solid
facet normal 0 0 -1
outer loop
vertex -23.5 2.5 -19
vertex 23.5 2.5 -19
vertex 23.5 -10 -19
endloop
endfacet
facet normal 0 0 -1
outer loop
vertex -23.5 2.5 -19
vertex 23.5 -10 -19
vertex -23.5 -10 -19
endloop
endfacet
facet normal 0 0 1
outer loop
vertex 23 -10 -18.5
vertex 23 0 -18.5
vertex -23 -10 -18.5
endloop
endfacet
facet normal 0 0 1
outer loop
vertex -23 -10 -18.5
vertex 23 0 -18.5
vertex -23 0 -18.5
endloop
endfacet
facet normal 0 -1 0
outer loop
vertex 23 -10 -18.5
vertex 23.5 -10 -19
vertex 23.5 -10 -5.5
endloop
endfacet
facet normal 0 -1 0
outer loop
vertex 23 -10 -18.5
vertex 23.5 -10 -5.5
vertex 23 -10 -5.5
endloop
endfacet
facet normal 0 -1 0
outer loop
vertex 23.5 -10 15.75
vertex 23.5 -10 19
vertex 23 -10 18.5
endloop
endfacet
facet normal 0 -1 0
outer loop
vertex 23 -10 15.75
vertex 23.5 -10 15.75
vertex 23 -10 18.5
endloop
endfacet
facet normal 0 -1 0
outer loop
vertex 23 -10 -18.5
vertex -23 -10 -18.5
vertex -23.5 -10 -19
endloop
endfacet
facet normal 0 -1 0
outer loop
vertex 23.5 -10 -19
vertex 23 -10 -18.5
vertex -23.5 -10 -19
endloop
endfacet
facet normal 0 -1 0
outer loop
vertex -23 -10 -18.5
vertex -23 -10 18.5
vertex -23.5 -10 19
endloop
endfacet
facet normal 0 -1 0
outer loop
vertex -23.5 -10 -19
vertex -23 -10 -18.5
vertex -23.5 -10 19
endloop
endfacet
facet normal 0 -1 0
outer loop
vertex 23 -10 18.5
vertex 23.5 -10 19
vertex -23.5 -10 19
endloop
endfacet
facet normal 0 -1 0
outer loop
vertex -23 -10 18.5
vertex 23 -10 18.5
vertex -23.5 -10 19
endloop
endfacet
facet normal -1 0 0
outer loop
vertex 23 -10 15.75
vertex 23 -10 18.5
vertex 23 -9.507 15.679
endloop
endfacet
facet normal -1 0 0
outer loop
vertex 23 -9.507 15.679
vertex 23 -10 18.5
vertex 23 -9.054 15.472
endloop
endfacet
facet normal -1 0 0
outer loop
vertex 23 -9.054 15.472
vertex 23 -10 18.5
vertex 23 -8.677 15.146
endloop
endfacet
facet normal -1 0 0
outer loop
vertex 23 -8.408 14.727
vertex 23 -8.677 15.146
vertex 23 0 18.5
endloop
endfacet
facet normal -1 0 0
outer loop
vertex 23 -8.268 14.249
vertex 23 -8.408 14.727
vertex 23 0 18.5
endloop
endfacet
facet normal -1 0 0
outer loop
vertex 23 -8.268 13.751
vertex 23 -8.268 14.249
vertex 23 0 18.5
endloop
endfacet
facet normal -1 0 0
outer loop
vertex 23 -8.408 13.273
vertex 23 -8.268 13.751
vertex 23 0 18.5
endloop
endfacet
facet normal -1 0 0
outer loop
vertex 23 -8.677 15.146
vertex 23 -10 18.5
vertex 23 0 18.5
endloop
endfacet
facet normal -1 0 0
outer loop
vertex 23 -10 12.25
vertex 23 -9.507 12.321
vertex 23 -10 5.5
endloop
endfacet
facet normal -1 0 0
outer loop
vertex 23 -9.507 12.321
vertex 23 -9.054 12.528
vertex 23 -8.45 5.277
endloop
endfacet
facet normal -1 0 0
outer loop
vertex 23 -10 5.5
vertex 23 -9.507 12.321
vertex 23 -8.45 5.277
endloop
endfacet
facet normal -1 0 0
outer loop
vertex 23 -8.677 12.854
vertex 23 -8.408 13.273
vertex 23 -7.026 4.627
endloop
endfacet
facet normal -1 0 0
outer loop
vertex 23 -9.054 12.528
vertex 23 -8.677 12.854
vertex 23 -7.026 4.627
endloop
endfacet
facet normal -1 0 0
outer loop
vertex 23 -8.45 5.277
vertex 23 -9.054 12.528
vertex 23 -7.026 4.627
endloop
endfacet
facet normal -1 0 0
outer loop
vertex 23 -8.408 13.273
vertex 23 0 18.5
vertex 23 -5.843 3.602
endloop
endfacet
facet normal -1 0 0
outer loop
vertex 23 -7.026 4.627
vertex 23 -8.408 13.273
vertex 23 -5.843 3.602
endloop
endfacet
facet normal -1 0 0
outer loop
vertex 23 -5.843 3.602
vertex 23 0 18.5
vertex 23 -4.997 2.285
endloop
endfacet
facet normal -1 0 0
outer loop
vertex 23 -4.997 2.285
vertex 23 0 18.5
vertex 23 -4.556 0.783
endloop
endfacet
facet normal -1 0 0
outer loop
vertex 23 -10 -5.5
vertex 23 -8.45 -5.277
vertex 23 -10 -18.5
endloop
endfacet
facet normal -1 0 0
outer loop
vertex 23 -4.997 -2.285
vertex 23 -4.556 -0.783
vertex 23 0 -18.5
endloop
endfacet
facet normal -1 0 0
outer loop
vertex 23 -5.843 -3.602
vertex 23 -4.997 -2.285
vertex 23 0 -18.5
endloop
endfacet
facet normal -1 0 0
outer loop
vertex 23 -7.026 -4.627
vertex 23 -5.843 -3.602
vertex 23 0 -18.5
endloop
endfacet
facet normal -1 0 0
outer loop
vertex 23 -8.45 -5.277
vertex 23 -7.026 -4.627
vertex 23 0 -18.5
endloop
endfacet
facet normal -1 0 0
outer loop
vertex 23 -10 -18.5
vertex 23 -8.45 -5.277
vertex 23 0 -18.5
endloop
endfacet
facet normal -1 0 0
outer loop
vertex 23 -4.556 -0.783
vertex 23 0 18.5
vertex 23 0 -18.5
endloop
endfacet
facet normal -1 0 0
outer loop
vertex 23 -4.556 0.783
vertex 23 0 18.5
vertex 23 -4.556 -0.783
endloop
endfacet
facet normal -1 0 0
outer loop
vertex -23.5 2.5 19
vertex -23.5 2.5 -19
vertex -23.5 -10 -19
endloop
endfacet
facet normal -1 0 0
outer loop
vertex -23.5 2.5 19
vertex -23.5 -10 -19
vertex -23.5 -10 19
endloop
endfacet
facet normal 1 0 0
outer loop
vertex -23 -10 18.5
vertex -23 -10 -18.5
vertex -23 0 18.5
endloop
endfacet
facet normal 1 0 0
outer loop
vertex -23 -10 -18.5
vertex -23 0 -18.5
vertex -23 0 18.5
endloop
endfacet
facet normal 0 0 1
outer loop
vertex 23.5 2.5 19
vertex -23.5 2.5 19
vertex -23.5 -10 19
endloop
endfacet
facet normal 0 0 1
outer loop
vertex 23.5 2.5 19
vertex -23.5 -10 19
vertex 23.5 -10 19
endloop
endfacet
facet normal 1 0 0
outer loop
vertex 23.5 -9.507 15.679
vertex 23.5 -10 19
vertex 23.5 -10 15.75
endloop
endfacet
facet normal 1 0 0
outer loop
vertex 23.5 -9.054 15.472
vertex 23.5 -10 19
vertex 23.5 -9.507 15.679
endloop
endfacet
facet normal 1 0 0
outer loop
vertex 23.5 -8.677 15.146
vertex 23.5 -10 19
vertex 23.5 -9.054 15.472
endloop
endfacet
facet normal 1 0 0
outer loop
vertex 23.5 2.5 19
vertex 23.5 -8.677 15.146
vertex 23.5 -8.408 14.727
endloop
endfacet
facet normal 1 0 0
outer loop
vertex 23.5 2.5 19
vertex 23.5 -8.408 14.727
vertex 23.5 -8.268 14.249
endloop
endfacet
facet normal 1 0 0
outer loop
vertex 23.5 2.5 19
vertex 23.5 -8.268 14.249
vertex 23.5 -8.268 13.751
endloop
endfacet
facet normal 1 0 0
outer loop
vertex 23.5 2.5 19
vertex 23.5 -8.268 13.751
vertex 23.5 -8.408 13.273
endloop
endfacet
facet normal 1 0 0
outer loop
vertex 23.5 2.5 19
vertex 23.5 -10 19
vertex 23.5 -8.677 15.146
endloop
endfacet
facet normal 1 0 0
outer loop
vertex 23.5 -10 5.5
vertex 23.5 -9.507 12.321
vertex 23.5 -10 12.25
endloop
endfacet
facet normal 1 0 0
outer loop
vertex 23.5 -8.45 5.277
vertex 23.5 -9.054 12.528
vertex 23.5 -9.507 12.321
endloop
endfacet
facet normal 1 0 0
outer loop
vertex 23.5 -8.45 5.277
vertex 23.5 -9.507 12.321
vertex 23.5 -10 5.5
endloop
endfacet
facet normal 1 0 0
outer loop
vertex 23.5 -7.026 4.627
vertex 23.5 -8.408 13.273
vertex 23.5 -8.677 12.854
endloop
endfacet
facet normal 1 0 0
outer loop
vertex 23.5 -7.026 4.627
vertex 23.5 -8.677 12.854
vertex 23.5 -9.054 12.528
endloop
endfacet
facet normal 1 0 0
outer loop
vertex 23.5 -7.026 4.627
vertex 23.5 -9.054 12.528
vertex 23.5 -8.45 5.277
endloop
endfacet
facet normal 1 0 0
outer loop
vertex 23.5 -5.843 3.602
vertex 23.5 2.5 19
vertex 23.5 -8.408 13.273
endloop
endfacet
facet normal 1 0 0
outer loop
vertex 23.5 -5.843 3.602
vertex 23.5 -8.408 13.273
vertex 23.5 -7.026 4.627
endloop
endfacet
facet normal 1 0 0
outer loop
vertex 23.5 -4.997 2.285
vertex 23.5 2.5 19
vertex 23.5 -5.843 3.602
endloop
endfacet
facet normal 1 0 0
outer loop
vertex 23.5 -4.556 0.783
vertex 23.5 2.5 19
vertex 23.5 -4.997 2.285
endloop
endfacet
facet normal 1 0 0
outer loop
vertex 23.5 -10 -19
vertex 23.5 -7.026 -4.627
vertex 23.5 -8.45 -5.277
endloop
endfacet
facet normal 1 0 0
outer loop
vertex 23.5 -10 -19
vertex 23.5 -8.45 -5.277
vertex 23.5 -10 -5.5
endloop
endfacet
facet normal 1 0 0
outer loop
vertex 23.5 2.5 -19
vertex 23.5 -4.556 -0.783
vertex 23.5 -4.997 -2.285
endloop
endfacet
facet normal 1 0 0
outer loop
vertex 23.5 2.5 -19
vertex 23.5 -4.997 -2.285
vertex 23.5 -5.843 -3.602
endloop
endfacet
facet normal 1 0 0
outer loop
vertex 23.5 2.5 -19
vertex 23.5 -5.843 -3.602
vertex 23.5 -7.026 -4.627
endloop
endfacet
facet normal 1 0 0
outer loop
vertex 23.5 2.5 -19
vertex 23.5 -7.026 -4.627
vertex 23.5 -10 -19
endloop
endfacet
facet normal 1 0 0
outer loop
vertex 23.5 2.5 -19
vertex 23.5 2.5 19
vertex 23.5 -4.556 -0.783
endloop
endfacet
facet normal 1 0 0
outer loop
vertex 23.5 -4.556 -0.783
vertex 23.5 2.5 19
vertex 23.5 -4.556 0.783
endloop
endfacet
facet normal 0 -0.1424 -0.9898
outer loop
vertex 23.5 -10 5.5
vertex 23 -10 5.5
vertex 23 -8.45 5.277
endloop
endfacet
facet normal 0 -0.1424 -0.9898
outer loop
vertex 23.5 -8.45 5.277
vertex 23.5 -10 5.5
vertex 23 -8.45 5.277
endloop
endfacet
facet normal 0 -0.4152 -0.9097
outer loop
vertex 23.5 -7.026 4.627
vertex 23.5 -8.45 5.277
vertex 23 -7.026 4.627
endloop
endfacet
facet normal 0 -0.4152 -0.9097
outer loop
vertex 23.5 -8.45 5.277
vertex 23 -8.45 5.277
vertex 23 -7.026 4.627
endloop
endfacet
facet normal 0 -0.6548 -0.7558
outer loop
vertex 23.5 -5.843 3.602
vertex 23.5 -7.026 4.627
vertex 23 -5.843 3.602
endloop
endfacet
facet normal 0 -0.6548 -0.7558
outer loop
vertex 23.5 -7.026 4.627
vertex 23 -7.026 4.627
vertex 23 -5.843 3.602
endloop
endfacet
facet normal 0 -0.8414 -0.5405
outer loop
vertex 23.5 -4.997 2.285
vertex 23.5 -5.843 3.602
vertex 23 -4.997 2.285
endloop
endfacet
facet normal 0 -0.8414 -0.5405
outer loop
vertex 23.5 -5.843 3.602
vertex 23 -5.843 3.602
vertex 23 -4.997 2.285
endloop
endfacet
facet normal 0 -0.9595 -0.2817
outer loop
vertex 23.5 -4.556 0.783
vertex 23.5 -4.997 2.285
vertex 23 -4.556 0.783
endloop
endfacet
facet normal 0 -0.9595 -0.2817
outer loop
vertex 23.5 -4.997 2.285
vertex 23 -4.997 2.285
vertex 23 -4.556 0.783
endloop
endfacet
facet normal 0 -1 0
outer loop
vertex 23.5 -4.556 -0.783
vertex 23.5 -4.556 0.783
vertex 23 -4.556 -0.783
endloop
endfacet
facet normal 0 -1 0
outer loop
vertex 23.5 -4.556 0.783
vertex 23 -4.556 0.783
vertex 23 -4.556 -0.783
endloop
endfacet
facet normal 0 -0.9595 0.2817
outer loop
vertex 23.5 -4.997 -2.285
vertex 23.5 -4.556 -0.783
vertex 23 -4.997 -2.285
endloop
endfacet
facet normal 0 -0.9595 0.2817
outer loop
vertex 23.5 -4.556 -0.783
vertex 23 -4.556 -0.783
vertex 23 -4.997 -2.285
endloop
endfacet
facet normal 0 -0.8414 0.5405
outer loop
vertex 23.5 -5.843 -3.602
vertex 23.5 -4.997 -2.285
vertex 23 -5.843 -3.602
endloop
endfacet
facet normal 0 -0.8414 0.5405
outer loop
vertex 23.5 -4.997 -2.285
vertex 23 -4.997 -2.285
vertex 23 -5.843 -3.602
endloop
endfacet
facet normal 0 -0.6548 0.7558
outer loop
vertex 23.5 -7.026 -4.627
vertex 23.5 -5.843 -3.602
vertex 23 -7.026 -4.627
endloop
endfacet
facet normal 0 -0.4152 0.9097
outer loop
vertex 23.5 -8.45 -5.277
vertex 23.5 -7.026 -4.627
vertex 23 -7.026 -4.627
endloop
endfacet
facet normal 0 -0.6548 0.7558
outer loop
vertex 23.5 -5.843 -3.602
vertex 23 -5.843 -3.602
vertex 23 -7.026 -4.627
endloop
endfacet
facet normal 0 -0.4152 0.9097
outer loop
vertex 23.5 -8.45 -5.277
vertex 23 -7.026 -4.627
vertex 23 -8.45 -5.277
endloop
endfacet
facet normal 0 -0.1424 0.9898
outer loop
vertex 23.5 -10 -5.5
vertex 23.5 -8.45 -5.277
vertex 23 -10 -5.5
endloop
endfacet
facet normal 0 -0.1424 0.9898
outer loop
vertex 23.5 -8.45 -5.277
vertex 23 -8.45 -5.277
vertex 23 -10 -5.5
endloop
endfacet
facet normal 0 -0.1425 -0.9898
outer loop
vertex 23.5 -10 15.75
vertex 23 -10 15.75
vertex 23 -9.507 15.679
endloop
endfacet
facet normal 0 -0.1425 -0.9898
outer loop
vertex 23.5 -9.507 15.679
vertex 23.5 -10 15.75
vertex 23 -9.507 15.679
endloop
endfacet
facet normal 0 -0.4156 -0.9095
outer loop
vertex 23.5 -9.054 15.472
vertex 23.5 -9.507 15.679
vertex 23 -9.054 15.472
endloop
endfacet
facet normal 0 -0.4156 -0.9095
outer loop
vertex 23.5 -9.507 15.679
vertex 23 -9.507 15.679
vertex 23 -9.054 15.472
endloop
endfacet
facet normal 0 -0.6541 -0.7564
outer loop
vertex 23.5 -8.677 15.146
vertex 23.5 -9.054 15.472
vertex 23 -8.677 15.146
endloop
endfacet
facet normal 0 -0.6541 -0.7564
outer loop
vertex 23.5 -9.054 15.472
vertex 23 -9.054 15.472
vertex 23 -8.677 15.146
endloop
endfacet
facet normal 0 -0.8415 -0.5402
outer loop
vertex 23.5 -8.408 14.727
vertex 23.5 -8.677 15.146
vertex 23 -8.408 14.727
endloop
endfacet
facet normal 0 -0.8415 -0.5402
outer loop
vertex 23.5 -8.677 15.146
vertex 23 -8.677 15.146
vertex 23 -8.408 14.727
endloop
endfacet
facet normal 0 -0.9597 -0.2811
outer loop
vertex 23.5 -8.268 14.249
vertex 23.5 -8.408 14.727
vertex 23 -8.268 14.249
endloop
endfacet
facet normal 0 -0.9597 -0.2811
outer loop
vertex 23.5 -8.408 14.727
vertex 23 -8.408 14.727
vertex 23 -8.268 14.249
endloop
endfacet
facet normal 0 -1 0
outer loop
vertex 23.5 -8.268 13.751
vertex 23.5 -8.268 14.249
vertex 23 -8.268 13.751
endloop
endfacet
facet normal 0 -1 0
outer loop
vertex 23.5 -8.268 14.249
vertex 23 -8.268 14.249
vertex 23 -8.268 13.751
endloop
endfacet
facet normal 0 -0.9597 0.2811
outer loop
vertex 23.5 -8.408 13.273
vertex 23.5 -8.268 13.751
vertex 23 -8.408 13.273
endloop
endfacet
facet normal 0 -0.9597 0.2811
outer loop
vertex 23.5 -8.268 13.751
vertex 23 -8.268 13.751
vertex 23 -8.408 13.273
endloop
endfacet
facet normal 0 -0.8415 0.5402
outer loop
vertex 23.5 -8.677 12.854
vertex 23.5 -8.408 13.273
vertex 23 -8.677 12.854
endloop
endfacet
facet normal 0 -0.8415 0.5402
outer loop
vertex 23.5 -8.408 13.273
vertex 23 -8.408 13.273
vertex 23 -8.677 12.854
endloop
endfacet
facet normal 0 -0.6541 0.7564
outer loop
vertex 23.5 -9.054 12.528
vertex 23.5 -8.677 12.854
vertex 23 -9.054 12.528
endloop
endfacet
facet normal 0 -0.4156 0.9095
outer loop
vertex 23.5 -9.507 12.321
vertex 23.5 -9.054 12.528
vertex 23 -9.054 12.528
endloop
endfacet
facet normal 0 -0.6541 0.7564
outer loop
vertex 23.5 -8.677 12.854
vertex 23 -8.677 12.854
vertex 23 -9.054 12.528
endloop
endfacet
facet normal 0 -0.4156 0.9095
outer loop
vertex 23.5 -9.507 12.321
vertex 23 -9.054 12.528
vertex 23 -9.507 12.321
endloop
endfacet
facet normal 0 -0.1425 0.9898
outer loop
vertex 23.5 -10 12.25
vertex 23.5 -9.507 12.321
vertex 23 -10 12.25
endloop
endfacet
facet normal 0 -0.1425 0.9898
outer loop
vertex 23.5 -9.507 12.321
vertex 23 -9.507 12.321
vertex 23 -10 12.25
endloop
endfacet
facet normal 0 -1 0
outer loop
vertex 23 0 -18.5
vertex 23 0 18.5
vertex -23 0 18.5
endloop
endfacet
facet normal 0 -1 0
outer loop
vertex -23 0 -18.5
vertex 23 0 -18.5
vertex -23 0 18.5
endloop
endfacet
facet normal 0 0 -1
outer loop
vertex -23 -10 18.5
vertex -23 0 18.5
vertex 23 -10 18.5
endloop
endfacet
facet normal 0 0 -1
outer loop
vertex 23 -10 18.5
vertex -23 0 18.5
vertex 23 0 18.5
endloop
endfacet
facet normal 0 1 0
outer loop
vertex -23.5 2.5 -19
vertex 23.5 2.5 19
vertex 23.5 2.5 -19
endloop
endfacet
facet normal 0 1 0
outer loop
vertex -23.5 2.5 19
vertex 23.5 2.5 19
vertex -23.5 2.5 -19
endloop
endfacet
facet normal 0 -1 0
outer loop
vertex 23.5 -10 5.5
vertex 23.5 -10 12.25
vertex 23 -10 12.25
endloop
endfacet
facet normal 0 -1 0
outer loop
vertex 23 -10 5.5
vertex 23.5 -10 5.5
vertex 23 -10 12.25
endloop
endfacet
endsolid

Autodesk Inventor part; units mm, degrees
ref_plane "YZ Plane" through (0, 0, 0) normal (1, 0, 0) x (0, 1, 0)
ref_plane "XZ Plane" through (0, 0, 0) normal (0, 1, 0) x (-1, 0, 0)
ref_plane "XY Plane" through (0, 0, 0) normal (0, 0, 1) x (1, 0, 0)
sketch "Sketch1" plane through (0, 0, 0) normal (0, 1, 0) x (-1, 0, 0)
  line L0 (-23.5, -19) -> (23.5, -19)
  line L1 (23.5, -19) -> (23.5, 19)
  line L2 (23.5, 19) -> (-23.5, 19)
  line L3 (-23.5, 19) -> (-23.5, -19)
  line L4 (-23.5, -19) -> (23.5, 19) construction
  line L5 (23.5, -19) -> (-23.5, 19) construction
  line L6 (-23, -18.5) -> (23, -18.5)
  line L7 (23, -18.5) -> (23, 18.5)
  line L8 (23, 18.5) -> (-23, 18.5)
  line L9 (-23, 18.5) -> (-23, -18.5)
  line L10 (-23, -18.5) -> (23, 18.5) construction
  line L11 (23, -18.5) -> (-23, 18.5) construction
  point P0 (0, 0)
  dimension "d0" = 47
  dimension "d1" = 38
  dimension "d2" = 46
  dimension "d3" = 37
extrude "Extrusion1" add sketch "Sketch1" along normal blind 2.5 contours L3 L2 L1 L0 | L9 L8 L7 L6
extrude "Extrusion2" add sketch "Sketch1" against normal blind 10
sketch "Sketch2" plane through (23.5, 2.5, 19) normal (1, 0, 0) x (0, 0, -1)
  line L0 (38, -12.5) -> (0, -12.5) projected
  line L1 (38, -12.5) -> (19, -12.5)
  line L2 (19, -12.5) -> (5, -12.5)
  point P0 (19, -2.5)
  dimension "d8" = 19
  dimension "d9" = 14
hole "Hole1" at (23.5, -10, 14) direction (-1, 0, 0) diameter 3.5 depth 8
hole "Hole2" at (23.5, -10, 0) direction (-1, 0, 0) diameter 11 depth 8
properties part number "HUDSON-1-54A"
